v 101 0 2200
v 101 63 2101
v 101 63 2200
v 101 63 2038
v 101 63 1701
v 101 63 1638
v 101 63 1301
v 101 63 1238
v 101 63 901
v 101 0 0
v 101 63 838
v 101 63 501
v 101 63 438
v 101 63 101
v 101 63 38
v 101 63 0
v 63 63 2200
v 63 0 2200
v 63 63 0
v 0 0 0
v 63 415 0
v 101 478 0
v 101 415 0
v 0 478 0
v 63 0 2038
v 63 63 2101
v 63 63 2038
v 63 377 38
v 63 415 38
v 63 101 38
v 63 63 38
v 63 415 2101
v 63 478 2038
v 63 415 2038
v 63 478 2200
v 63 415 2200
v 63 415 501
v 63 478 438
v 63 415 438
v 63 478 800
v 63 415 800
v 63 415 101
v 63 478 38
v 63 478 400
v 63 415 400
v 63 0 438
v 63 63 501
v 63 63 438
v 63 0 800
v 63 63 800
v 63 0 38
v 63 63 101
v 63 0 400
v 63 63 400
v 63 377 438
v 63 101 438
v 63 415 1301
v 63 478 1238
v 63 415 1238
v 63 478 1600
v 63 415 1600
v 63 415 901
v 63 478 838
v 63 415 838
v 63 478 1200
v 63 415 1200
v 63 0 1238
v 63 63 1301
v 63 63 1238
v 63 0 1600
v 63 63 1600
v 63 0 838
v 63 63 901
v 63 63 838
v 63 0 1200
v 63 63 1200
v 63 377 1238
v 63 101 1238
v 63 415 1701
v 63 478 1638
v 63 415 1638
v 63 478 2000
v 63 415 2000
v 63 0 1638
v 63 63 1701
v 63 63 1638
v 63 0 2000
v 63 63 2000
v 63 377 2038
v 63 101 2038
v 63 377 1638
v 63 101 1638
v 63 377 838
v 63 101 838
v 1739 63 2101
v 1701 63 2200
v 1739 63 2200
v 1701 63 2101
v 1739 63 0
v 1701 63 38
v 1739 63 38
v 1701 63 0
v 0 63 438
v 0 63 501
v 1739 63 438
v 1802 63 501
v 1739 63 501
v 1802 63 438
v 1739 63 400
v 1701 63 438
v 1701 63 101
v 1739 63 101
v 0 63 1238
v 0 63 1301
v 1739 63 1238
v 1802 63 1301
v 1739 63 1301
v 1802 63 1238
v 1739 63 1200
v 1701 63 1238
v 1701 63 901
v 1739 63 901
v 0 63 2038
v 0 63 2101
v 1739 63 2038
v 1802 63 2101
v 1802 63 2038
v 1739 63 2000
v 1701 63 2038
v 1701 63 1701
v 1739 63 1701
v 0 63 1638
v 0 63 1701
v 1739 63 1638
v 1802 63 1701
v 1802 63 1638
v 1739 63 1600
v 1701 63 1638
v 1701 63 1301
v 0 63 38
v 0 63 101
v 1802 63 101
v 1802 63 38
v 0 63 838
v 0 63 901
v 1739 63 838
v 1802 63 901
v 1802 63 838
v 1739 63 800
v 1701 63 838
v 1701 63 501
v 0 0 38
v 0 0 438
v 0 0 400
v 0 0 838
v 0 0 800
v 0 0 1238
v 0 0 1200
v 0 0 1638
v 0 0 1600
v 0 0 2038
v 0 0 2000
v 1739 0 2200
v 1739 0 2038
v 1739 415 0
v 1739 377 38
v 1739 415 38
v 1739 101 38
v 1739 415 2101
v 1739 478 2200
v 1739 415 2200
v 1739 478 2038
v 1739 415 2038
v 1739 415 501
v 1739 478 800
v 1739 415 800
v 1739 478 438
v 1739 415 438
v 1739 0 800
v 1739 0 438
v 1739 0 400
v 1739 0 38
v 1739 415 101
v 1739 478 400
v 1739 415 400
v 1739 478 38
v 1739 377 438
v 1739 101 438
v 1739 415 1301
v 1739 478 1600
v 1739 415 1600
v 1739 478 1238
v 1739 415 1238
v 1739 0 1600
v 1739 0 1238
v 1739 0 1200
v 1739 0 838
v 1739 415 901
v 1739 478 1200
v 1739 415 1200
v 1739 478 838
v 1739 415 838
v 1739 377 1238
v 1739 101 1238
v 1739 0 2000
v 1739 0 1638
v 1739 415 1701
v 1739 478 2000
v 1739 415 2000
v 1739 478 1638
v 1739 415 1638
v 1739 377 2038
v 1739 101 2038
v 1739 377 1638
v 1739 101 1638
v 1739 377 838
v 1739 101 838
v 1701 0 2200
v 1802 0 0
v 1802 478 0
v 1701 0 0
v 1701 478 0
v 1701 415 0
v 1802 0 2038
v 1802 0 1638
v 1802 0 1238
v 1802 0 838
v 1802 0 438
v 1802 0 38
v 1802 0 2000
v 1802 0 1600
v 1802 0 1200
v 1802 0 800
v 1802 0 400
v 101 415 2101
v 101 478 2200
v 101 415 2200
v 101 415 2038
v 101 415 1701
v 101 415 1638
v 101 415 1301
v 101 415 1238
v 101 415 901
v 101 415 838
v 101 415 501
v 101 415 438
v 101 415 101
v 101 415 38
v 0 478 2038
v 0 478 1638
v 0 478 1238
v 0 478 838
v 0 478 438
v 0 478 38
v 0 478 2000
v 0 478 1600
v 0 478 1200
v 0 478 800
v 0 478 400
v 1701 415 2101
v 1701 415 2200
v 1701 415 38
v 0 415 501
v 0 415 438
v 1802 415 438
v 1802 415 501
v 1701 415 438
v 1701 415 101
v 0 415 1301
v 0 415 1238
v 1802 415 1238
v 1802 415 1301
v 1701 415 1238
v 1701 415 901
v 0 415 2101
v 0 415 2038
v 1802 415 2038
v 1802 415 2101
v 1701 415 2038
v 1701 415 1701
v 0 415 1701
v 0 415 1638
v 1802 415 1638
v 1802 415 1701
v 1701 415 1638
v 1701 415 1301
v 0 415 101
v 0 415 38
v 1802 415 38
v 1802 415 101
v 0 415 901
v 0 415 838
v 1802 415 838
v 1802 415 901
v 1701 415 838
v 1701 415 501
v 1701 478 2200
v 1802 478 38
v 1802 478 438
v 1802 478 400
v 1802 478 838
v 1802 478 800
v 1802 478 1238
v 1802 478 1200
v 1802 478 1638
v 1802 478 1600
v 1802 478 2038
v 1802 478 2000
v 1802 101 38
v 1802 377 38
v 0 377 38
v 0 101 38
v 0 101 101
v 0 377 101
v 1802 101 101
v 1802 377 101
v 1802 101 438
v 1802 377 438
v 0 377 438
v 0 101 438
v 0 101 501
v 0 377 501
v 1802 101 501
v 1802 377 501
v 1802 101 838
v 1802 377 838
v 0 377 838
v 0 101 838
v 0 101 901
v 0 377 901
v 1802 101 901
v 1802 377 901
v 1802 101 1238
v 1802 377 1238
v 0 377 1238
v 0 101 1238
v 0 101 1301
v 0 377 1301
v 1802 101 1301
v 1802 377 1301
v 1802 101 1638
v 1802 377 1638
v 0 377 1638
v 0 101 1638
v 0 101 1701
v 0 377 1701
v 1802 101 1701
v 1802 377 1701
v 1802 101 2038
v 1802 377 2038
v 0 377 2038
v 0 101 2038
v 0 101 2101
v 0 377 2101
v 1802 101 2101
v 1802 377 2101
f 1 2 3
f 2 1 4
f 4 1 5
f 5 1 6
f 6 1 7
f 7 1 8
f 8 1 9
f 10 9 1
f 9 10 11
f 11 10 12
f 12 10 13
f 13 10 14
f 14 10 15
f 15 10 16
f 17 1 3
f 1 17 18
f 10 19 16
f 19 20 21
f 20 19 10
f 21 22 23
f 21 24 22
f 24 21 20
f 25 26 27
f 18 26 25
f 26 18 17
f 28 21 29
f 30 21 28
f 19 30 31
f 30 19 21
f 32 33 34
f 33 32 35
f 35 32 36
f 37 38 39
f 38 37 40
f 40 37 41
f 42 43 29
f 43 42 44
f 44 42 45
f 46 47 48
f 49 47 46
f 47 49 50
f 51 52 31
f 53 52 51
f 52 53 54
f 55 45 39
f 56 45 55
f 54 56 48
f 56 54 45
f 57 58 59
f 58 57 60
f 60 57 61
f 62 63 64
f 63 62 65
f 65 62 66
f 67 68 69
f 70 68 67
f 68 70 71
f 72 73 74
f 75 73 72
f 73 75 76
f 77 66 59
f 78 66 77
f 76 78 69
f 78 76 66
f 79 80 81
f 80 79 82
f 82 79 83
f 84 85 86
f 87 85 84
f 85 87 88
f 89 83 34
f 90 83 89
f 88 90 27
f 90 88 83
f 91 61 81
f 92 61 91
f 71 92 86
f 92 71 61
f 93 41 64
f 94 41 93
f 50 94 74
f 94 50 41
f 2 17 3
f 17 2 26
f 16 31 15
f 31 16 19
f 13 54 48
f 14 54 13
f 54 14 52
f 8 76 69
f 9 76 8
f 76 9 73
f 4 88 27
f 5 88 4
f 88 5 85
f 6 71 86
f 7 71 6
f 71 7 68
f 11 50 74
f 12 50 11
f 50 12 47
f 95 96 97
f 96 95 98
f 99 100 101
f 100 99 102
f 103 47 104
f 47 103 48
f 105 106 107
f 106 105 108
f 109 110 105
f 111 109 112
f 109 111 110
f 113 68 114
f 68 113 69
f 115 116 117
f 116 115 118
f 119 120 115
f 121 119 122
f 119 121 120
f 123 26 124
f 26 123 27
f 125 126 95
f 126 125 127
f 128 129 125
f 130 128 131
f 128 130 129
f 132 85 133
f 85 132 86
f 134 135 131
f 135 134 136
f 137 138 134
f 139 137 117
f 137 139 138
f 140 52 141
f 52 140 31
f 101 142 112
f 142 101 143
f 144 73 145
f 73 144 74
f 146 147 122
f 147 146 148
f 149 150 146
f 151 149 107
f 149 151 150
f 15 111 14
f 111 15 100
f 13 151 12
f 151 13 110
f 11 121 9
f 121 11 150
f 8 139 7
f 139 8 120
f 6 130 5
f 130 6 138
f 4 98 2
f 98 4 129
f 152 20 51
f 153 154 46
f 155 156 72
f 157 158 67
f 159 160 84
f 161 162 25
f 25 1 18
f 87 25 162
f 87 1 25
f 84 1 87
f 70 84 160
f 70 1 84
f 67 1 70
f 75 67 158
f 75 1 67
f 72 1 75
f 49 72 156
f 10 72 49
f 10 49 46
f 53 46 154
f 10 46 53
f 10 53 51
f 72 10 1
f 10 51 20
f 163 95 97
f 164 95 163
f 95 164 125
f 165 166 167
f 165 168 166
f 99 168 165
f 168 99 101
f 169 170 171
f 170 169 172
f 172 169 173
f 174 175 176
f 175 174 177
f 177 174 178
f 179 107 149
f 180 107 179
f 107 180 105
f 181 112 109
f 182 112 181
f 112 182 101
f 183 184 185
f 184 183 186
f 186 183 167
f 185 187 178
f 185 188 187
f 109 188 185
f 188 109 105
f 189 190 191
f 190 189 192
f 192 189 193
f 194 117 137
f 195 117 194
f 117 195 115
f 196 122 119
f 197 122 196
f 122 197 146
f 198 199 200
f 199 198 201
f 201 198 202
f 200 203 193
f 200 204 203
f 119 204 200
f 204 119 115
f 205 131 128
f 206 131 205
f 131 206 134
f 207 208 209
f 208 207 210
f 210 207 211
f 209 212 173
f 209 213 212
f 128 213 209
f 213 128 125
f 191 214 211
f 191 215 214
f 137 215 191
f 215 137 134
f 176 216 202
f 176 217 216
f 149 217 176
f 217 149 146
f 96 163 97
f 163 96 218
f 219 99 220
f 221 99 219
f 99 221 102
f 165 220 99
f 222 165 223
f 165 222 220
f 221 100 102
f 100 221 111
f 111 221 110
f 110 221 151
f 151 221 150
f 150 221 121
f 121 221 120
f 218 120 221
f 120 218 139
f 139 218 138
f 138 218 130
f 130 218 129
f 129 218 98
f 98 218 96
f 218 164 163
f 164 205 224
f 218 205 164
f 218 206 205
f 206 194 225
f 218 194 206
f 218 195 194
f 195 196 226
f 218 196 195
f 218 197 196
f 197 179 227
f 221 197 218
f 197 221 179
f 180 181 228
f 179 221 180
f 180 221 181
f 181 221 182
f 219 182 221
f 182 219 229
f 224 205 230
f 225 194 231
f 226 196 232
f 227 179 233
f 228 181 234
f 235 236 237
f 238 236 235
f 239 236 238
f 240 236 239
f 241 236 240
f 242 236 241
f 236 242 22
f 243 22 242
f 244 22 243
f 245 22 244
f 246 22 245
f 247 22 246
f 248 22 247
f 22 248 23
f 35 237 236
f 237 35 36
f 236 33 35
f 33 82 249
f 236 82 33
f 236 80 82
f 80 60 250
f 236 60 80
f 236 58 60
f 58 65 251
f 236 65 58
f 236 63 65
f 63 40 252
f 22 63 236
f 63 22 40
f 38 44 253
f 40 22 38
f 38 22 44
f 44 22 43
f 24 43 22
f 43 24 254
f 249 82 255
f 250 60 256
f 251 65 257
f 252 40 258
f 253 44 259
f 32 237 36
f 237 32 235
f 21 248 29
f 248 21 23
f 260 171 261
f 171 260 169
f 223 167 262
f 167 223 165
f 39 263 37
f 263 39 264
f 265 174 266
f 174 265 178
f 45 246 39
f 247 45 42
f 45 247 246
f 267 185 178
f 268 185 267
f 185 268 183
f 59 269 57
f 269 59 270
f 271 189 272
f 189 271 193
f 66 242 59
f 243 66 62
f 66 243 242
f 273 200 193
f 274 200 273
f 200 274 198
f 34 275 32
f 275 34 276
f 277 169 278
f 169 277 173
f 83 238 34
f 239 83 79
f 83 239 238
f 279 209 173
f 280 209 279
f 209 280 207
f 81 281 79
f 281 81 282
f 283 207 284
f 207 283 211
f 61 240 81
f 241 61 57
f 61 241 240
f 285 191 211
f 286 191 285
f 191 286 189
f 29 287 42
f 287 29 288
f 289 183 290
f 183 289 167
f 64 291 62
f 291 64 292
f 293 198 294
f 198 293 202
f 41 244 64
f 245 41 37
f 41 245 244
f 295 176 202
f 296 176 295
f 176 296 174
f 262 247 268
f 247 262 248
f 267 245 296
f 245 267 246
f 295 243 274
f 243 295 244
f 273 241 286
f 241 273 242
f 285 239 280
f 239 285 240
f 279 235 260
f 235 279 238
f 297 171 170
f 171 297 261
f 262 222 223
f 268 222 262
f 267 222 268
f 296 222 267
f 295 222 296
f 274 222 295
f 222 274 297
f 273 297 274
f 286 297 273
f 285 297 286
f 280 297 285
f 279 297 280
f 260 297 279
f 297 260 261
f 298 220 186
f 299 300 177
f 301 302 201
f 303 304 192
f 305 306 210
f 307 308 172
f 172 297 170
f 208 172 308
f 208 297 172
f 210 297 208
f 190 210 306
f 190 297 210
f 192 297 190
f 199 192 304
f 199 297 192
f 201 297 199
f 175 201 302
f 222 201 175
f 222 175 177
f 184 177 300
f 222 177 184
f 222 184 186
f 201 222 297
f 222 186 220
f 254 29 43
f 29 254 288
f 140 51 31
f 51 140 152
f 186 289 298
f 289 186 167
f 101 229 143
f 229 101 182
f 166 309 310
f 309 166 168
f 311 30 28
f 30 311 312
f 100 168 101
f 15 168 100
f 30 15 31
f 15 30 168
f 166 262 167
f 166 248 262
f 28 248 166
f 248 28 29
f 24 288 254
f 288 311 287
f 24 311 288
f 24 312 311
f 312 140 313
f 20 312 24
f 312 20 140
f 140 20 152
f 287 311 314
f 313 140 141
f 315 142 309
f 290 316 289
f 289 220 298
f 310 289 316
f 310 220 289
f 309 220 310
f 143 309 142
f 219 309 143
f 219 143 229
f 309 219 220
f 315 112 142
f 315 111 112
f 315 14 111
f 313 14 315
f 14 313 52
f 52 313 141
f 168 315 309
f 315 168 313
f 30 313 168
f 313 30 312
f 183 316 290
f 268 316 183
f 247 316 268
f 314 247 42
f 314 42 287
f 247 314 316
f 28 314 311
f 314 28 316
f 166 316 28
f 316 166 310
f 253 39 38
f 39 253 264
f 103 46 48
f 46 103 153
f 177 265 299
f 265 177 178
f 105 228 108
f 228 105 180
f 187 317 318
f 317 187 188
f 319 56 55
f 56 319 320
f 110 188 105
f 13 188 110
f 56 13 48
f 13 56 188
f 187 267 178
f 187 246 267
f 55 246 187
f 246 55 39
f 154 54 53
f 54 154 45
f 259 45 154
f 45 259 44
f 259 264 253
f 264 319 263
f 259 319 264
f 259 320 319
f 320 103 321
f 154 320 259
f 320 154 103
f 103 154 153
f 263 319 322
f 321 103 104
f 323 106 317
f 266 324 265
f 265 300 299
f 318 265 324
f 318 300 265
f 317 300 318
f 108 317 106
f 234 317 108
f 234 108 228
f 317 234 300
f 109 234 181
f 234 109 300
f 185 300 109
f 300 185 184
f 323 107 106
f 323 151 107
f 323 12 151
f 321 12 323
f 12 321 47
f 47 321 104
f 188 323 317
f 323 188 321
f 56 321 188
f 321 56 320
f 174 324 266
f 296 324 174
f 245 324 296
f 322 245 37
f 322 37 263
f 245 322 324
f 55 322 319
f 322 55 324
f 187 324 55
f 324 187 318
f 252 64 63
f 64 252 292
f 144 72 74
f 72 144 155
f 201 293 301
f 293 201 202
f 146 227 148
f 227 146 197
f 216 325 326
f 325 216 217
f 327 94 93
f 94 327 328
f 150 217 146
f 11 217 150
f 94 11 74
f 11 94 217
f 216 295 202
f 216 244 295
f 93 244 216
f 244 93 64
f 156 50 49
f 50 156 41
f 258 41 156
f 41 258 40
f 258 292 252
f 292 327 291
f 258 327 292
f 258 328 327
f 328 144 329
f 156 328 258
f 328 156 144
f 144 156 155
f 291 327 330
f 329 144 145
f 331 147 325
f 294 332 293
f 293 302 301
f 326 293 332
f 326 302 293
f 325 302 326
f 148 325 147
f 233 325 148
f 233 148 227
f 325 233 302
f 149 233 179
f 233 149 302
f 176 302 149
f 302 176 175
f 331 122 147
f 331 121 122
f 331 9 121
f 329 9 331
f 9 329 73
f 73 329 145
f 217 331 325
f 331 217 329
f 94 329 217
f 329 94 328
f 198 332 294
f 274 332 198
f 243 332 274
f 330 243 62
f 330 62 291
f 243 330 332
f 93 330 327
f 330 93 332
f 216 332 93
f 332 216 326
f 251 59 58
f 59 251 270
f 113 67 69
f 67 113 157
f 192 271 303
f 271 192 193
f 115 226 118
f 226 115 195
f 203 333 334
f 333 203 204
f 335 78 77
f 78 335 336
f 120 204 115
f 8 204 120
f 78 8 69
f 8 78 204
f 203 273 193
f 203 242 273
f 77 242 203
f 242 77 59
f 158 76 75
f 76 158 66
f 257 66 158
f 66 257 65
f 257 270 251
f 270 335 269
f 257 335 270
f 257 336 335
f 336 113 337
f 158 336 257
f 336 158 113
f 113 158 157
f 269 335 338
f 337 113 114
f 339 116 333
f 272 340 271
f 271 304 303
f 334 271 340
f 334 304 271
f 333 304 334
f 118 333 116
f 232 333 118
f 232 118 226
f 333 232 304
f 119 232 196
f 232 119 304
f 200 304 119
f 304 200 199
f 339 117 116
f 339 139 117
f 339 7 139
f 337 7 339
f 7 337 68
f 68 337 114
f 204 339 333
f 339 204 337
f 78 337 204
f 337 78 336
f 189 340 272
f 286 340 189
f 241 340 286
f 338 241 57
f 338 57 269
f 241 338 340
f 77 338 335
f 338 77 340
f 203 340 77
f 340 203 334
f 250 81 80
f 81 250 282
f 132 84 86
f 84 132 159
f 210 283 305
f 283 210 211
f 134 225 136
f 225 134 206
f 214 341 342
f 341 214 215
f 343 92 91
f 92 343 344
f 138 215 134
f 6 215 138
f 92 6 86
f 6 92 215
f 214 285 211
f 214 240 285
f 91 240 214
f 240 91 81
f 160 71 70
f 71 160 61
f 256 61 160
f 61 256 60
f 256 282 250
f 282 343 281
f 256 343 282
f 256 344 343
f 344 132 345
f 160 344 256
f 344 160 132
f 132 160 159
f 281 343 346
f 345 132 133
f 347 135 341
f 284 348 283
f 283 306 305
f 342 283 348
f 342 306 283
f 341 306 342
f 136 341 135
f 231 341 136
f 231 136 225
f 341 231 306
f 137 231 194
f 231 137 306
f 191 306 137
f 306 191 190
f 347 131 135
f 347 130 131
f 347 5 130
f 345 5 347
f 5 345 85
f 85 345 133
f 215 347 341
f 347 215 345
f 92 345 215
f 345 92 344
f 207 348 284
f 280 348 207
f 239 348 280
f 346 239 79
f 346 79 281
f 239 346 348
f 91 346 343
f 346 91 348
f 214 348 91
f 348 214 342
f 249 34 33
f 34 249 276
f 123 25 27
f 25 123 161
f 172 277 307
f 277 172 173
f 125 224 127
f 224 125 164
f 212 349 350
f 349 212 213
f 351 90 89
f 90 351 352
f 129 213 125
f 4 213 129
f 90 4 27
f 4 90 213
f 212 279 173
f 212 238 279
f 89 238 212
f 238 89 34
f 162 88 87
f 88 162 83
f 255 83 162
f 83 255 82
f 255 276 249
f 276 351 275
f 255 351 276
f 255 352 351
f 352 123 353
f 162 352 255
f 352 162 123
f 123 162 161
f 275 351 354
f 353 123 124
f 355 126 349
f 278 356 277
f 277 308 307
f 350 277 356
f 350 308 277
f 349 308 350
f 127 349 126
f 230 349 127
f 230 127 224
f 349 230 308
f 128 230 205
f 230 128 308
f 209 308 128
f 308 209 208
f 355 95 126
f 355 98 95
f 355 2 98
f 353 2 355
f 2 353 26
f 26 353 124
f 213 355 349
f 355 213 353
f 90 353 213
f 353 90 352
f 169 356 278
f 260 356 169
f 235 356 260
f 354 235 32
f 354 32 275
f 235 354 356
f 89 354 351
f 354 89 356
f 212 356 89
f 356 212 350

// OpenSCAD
/* Not actually for CNC! */

box_offset = 400;

beam_width = 63;
beam_depth = 38;
beam_length = 2400;

height = beam_length;
depth = 478;
width = 4 * box_offset + 2 * (beam_width + beam_depth);

echo("width is", width);
echo("offcut is", beam_length - (width + depth));

boxes = floor((width - (2*(beam_width+beam_depth))) / box_offset);

box_height = 308;
shelf_thickness = 25;

tweak = 4;
level_offset = box_height + shelf_thickness + beam_width + tweak;
echo("level offset is", level_offset);
levels = floor(height / level_offset);

trimmed_height = (levels - 0.5) * level_offset;

with_shelves = false;
with_boxes = false;

flat_used = with_shelves ? shelf_thickness : 0;

echo("trimmed height is", trimmed_height, "so trim", height - trimmed_height, "from uprights");

color("red") {
     translate([beam_width, 0, 0])
          cube([beam_depth, beam_width, trimmed_height]);
     translate([width - (beam_width + beam_depth), 0, 0])
          cube([beam_depth, beam_width, trimmed_height]);
     translate([beam_width, depth-beam_width, 0])
          cube([beam_depth, beam_width, trimmed_height]);
     translate([width - (beam_width + beam_depth), depth-beam_width, 0])
          cube([beam_depth, beam_width, trimmed_height]);
}

for (i=[0:levels-1]) {
     translate([0, 0, i * level_offset]) {
          color("blue") {
               cube([beam_width, depth, beam_depth]);
               translate([width-beam_width, 0, 0]) cube([beam_width, depth, beam_depth]);
          }

          color("green") {
               translate([0, beam_width, beam_depth])
                    cube([width, beam_depth, beam_width]);
               translate([0, depth - (beam_width+beam_depth), beam_depth])
                    cube([width, beam_depth, beam_width]);
          }

          if (with_shelves)
               color("yellow")
                    translate([beam_width+beam_depth, 0, beam_width+beam_depth])
                    cube([width - 2 * (beam_width+beam_depth), depth, shelf_thickness]);
     }
     if (with_boxes)
          translate([beam_width + beam_depth, 0, flat_used + beam_width + beam_depth + i * level_offset])
               for (j=[0:boxes-1])
                    translate([j*box_offset, 0, 0])
                         if (i % 2 == 0) {
                              box(i, j);
                         } else {
                              crate(i, j);
                         }
                                     
}

module box(col0, col1) {
     color([col0/6, col1/4, 0.5, 0.25])
          cube([388, 478, box_height]);
}

module crate(col0, col1) {
     color([col0/6, col1/4, 0.5, 0.25])
          cube([346, 478, 238]);
}
